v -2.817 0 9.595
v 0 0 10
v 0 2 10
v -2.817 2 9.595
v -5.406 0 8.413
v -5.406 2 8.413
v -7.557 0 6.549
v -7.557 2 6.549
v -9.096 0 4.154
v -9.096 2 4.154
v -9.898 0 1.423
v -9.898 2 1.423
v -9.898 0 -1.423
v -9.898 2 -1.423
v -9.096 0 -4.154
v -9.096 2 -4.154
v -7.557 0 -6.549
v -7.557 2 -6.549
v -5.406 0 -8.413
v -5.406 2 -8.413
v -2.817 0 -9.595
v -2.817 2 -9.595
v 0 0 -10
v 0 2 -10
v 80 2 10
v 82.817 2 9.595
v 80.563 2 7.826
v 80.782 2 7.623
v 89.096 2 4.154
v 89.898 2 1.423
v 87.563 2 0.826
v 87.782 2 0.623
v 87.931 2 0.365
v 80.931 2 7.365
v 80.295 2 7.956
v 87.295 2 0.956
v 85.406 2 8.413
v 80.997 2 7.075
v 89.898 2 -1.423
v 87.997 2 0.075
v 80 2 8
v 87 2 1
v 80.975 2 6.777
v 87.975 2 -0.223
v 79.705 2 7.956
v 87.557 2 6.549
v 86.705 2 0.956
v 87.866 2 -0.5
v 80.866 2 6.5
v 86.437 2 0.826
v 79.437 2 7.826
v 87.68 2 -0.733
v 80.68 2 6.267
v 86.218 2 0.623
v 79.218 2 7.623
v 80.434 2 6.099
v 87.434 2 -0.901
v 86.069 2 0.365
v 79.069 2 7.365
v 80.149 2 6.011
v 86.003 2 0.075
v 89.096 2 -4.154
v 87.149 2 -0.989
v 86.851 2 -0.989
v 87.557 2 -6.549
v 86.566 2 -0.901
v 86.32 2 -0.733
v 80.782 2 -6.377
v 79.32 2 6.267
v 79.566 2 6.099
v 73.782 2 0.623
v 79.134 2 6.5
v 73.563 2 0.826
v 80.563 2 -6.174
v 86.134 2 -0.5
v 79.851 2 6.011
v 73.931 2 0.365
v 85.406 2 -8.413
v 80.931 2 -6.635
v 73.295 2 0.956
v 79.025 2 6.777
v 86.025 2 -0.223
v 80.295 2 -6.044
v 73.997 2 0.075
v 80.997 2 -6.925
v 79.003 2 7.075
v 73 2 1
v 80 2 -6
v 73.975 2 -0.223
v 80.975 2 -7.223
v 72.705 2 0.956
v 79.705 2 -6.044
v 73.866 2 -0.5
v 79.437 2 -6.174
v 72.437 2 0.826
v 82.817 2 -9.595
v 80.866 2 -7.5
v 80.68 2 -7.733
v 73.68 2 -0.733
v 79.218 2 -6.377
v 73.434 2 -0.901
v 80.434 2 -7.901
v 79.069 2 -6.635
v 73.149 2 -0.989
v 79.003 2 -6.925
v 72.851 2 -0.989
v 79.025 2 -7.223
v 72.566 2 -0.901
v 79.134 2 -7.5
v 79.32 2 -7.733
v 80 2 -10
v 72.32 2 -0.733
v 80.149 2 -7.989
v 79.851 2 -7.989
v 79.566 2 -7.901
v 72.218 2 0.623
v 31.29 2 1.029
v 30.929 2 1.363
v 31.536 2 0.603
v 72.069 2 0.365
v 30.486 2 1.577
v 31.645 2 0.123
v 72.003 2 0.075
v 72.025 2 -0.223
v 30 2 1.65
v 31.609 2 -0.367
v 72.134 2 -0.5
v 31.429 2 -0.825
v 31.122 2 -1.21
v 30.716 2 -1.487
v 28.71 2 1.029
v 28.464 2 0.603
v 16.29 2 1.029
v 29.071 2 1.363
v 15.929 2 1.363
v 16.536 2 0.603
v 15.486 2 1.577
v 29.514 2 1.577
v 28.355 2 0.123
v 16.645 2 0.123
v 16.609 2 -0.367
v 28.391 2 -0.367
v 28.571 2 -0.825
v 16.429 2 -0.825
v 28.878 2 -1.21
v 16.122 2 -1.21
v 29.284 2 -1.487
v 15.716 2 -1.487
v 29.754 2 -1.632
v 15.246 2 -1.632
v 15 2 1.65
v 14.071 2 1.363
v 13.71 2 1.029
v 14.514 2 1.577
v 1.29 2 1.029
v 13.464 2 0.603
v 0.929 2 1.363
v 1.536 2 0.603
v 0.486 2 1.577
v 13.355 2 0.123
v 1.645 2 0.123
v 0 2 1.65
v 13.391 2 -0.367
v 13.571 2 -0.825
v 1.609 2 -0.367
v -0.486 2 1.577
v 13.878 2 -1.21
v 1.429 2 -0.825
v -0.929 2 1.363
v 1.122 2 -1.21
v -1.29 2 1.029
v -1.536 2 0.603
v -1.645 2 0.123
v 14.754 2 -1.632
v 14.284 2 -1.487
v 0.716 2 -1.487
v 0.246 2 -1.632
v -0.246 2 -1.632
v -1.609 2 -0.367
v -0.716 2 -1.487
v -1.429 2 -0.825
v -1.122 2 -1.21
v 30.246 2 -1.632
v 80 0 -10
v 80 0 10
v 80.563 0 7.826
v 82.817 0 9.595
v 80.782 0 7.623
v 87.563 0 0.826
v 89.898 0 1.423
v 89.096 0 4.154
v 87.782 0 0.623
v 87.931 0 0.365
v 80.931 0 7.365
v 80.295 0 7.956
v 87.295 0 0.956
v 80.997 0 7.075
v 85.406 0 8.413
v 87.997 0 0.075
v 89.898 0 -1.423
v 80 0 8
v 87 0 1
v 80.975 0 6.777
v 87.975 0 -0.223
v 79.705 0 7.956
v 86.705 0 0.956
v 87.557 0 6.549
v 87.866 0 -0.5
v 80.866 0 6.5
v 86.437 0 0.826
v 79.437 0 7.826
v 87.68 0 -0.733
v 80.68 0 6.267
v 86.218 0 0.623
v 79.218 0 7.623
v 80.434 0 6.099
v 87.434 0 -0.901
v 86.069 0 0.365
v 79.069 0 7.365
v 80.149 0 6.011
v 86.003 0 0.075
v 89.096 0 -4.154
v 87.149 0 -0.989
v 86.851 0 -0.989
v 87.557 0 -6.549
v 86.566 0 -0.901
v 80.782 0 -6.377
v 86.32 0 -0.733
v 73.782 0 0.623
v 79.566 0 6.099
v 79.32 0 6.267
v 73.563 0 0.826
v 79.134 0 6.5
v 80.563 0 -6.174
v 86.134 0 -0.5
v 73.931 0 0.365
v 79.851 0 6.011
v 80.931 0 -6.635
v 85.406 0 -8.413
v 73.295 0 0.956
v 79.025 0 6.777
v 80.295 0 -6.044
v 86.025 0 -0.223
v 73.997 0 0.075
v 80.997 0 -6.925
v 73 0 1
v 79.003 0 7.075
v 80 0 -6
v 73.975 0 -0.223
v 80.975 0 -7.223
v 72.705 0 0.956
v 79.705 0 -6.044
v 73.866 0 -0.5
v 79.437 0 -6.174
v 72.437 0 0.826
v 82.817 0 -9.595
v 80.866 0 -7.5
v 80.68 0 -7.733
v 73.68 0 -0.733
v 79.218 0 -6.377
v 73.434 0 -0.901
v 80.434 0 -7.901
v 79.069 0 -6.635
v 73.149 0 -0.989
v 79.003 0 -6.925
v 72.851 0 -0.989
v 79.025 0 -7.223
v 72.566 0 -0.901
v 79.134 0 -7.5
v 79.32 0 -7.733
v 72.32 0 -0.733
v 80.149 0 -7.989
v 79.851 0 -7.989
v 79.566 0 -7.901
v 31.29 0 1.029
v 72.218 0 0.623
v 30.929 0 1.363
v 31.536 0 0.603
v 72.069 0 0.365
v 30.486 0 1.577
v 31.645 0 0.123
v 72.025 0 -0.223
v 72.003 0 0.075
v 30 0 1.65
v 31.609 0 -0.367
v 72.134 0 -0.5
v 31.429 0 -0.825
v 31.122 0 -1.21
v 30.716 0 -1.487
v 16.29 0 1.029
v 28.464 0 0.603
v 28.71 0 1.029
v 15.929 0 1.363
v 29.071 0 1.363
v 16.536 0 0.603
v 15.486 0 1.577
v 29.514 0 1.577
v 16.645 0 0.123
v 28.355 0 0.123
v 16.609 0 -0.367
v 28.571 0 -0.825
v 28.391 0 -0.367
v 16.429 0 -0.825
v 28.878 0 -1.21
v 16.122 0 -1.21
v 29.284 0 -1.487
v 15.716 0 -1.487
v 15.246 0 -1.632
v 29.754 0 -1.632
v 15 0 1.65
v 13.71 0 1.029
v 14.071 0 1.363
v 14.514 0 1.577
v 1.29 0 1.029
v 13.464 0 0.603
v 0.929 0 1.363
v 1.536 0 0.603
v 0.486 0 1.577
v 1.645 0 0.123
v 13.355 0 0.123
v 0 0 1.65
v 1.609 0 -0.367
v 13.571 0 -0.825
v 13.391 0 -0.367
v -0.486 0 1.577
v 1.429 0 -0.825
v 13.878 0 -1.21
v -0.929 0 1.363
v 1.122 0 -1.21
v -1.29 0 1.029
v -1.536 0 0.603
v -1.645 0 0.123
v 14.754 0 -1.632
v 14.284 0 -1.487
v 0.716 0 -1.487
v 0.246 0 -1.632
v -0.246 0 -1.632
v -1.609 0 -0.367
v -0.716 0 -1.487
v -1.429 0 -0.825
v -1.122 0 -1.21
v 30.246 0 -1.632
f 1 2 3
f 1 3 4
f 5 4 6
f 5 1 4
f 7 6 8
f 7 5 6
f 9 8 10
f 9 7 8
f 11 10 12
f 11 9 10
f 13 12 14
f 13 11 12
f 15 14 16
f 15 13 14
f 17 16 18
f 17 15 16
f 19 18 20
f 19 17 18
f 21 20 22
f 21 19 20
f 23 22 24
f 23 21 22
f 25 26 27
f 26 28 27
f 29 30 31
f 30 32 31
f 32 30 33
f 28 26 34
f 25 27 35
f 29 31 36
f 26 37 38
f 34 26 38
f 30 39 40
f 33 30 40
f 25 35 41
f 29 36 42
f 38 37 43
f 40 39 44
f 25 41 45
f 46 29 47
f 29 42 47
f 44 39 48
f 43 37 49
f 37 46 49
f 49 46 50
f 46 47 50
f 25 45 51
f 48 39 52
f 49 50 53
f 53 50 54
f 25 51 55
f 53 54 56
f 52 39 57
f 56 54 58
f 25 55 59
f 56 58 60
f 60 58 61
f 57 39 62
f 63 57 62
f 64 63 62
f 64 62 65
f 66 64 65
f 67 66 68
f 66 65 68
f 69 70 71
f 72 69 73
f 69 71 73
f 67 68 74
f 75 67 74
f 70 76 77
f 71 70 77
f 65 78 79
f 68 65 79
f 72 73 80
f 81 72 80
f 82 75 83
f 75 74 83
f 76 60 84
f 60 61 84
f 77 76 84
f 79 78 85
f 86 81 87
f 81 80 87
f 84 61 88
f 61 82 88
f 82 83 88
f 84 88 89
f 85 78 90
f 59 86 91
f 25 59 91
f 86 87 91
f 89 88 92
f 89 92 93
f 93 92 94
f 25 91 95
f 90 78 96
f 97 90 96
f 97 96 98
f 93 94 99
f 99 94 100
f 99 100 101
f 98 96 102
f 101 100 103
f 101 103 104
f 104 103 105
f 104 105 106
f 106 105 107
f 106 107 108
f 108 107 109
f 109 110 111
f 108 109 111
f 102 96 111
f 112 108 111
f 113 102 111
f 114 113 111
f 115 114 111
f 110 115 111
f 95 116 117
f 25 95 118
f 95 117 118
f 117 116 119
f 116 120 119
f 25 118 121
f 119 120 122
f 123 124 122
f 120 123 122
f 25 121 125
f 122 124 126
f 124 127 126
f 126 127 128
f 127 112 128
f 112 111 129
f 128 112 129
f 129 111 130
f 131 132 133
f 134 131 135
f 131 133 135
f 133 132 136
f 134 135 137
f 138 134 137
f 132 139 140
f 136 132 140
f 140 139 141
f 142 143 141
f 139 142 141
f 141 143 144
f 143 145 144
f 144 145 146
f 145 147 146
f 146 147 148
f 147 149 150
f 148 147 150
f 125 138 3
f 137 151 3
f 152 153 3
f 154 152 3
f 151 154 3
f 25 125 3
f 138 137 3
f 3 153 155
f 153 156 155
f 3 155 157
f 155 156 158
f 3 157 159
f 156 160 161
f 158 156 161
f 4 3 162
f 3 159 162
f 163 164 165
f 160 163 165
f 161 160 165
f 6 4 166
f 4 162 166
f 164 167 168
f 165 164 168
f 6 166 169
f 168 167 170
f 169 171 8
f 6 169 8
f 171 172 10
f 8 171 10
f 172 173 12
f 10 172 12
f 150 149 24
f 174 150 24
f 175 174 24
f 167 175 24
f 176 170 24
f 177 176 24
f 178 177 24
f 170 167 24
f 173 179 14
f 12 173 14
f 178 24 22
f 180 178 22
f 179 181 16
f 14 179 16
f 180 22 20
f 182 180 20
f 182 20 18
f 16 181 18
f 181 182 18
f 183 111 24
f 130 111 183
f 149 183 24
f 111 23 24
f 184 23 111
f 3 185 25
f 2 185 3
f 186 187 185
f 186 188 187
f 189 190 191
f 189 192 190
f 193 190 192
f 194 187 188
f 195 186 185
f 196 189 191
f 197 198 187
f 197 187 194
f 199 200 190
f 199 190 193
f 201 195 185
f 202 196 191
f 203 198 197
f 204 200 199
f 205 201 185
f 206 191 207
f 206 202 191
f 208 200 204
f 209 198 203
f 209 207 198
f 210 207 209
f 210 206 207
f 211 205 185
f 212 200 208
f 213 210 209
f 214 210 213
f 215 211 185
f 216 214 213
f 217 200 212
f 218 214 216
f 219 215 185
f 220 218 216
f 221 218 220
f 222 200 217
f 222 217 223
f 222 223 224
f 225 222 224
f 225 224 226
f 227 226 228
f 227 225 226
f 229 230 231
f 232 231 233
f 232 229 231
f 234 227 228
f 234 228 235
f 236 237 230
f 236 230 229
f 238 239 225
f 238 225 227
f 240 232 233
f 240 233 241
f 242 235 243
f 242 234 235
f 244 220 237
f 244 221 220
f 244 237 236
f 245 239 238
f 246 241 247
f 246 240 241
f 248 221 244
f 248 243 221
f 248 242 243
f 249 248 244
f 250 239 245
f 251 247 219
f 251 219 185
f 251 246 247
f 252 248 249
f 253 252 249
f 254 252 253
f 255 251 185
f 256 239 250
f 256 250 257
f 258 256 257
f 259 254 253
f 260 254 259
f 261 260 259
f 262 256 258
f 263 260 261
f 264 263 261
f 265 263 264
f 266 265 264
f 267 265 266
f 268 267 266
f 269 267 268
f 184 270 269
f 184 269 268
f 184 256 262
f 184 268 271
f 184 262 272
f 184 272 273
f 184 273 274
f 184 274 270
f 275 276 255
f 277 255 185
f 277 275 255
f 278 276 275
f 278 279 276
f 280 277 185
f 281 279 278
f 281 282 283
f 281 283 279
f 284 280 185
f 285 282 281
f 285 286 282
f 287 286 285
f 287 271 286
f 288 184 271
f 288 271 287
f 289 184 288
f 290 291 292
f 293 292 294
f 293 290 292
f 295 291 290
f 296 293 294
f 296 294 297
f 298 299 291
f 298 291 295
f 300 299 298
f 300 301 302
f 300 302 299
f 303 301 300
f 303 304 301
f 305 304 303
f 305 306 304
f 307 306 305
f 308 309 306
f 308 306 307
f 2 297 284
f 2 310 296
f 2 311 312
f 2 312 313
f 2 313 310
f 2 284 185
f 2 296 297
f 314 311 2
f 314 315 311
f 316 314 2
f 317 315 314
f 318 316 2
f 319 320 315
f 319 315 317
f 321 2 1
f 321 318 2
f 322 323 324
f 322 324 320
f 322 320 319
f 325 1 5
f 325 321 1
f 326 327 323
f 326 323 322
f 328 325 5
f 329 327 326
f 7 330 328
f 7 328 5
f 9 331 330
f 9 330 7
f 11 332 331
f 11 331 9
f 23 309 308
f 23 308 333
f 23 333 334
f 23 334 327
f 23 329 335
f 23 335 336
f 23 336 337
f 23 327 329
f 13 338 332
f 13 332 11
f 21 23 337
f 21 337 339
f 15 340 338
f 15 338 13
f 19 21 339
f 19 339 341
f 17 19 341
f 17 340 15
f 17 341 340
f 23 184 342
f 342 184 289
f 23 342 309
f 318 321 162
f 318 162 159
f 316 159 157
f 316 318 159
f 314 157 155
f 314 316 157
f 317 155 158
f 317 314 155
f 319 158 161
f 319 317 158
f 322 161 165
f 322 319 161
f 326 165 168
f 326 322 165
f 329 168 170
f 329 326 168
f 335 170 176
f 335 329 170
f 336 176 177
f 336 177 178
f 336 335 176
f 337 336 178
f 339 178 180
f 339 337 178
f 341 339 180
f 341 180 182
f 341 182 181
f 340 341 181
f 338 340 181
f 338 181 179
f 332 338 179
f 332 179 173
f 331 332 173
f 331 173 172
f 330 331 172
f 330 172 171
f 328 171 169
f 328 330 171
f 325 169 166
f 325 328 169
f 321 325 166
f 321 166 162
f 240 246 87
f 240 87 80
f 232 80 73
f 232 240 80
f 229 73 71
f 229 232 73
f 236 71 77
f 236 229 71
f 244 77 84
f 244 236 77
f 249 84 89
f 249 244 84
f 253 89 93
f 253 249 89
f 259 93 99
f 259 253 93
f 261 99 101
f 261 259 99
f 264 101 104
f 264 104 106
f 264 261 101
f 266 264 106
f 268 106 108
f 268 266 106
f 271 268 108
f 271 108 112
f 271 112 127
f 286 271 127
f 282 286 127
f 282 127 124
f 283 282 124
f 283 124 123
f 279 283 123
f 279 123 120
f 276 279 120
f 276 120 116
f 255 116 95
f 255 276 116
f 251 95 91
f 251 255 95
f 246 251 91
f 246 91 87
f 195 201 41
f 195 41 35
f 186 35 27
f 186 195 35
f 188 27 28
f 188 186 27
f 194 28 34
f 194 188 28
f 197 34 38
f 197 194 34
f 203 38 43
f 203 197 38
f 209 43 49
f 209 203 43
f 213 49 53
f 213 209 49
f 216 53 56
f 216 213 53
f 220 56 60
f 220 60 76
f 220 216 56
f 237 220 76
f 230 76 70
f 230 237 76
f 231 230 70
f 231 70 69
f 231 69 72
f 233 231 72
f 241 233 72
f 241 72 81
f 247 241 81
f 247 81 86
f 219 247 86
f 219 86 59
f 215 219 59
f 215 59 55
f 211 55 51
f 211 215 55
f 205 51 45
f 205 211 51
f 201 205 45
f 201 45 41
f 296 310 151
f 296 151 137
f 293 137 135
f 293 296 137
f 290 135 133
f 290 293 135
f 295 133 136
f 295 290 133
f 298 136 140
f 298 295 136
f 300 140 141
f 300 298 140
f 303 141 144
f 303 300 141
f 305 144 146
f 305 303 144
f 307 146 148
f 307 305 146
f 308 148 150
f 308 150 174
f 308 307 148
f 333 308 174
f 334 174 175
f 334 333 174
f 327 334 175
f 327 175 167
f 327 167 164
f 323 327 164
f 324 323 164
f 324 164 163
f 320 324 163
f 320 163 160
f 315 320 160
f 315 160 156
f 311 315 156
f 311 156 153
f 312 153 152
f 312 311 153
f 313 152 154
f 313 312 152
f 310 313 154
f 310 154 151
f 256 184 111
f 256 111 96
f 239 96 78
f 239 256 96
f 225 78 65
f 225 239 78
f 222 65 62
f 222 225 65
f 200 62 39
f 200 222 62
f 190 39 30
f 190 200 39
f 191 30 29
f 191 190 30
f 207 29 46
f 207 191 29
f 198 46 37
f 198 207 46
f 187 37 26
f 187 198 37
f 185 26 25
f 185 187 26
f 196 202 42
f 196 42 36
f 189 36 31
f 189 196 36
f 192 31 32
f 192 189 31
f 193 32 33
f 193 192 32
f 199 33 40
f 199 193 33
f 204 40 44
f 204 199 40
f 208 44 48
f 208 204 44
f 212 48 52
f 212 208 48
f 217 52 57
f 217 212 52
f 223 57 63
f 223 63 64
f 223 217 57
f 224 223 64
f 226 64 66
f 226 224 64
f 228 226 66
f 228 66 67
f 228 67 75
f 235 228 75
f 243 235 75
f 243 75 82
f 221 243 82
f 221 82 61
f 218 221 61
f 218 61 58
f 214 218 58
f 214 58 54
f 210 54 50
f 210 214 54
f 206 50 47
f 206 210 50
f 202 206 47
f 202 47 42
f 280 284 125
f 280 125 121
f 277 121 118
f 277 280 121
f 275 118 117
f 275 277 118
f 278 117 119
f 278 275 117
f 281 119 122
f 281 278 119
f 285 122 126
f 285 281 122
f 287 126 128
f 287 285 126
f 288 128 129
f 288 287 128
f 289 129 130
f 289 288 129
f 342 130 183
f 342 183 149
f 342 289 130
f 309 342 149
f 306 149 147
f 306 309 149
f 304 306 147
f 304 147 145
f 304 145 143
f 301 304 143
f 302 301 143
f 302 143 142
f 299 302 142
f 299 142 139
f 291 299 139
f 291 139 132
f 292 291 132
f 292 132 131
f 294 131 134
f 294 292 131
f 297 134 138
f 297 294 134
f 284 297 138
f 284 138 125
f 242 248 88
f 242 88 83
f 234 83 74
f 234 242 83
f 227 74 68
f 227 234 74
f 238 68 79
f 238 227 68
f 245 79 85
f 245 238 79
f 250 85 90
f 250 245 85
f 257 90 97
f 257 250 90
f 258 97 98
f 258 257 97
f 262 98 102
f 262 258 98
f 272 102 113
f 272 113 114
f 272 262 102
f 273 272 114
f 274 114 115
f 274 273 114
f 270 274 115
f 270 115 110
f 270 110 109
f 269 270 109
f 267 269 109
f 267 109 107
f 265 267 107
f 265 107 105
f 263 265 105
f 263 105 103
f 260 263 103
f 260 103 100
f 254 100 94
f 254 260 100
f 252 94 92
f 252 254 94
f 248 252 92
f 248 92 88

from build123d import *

# Parameters (mm, degrees)
SKETCH_1_R      = 1.65
SKETCH_1_R_2    = 1
EXTRUDE_1_DEPTH = 2


with BuildPart() as part:
    # Эскиз1 → Бобышка-Вытянуть1 (new body)
    with BuildSketch(Plane(origin=(0, 0, 0), x_dir=(1, 0, 0), z_dir=(0, 1, 0))):
        with BuildLine():
            Line((0, 10), (80, 10))
            ThreePointArc((80, 10), (90, 0), (80, -10))
            Line((80, -10), (0, -10))
            ThreePointArc((0, -10), (-10, 0), (0, 10))
        make_face()
        with Locations(Location((30, 0, 0), (0, 0, 270))):
            Circle(SKETCH_1_R, mode=Mode.SUBTRACT)
        with Locations(Location((0, 0, 0), (0, 0, 270))):
            Circle(SKETCH_1_R, mode=Mode.SUBTRACT)
        with Locations(Location((15, 0, 0), (0, 0, 270))):
            Circle(SKETCH_1_R, mode=Mode.SUBTRACT)
        with Locations(Location((80, 7, 0), (0, 0, 270))):
            Circle(SKETCH_1_R_2, mode=Mode.SUBTRACT)
        with Locations(Location((87, 0, 0), (0, 0, 270))):
            Circle(SKETCH_1_R_2, mode=Mode.SUBTRACT)
        with Locations(Location((73, 0, 0), (0, 0, 270))):
            Circle(SKETCH_1_R_2, mode=Mode.SUBTRACT)
        with Locations(Location((80, -7, 0), (0, 0, 270))):
            Circle(SKETCH_1_R_2, mode=Mode.SUBTRACT)
    extrude(amount=EXTRUDE_1_DEPTH)


solid = part.part
